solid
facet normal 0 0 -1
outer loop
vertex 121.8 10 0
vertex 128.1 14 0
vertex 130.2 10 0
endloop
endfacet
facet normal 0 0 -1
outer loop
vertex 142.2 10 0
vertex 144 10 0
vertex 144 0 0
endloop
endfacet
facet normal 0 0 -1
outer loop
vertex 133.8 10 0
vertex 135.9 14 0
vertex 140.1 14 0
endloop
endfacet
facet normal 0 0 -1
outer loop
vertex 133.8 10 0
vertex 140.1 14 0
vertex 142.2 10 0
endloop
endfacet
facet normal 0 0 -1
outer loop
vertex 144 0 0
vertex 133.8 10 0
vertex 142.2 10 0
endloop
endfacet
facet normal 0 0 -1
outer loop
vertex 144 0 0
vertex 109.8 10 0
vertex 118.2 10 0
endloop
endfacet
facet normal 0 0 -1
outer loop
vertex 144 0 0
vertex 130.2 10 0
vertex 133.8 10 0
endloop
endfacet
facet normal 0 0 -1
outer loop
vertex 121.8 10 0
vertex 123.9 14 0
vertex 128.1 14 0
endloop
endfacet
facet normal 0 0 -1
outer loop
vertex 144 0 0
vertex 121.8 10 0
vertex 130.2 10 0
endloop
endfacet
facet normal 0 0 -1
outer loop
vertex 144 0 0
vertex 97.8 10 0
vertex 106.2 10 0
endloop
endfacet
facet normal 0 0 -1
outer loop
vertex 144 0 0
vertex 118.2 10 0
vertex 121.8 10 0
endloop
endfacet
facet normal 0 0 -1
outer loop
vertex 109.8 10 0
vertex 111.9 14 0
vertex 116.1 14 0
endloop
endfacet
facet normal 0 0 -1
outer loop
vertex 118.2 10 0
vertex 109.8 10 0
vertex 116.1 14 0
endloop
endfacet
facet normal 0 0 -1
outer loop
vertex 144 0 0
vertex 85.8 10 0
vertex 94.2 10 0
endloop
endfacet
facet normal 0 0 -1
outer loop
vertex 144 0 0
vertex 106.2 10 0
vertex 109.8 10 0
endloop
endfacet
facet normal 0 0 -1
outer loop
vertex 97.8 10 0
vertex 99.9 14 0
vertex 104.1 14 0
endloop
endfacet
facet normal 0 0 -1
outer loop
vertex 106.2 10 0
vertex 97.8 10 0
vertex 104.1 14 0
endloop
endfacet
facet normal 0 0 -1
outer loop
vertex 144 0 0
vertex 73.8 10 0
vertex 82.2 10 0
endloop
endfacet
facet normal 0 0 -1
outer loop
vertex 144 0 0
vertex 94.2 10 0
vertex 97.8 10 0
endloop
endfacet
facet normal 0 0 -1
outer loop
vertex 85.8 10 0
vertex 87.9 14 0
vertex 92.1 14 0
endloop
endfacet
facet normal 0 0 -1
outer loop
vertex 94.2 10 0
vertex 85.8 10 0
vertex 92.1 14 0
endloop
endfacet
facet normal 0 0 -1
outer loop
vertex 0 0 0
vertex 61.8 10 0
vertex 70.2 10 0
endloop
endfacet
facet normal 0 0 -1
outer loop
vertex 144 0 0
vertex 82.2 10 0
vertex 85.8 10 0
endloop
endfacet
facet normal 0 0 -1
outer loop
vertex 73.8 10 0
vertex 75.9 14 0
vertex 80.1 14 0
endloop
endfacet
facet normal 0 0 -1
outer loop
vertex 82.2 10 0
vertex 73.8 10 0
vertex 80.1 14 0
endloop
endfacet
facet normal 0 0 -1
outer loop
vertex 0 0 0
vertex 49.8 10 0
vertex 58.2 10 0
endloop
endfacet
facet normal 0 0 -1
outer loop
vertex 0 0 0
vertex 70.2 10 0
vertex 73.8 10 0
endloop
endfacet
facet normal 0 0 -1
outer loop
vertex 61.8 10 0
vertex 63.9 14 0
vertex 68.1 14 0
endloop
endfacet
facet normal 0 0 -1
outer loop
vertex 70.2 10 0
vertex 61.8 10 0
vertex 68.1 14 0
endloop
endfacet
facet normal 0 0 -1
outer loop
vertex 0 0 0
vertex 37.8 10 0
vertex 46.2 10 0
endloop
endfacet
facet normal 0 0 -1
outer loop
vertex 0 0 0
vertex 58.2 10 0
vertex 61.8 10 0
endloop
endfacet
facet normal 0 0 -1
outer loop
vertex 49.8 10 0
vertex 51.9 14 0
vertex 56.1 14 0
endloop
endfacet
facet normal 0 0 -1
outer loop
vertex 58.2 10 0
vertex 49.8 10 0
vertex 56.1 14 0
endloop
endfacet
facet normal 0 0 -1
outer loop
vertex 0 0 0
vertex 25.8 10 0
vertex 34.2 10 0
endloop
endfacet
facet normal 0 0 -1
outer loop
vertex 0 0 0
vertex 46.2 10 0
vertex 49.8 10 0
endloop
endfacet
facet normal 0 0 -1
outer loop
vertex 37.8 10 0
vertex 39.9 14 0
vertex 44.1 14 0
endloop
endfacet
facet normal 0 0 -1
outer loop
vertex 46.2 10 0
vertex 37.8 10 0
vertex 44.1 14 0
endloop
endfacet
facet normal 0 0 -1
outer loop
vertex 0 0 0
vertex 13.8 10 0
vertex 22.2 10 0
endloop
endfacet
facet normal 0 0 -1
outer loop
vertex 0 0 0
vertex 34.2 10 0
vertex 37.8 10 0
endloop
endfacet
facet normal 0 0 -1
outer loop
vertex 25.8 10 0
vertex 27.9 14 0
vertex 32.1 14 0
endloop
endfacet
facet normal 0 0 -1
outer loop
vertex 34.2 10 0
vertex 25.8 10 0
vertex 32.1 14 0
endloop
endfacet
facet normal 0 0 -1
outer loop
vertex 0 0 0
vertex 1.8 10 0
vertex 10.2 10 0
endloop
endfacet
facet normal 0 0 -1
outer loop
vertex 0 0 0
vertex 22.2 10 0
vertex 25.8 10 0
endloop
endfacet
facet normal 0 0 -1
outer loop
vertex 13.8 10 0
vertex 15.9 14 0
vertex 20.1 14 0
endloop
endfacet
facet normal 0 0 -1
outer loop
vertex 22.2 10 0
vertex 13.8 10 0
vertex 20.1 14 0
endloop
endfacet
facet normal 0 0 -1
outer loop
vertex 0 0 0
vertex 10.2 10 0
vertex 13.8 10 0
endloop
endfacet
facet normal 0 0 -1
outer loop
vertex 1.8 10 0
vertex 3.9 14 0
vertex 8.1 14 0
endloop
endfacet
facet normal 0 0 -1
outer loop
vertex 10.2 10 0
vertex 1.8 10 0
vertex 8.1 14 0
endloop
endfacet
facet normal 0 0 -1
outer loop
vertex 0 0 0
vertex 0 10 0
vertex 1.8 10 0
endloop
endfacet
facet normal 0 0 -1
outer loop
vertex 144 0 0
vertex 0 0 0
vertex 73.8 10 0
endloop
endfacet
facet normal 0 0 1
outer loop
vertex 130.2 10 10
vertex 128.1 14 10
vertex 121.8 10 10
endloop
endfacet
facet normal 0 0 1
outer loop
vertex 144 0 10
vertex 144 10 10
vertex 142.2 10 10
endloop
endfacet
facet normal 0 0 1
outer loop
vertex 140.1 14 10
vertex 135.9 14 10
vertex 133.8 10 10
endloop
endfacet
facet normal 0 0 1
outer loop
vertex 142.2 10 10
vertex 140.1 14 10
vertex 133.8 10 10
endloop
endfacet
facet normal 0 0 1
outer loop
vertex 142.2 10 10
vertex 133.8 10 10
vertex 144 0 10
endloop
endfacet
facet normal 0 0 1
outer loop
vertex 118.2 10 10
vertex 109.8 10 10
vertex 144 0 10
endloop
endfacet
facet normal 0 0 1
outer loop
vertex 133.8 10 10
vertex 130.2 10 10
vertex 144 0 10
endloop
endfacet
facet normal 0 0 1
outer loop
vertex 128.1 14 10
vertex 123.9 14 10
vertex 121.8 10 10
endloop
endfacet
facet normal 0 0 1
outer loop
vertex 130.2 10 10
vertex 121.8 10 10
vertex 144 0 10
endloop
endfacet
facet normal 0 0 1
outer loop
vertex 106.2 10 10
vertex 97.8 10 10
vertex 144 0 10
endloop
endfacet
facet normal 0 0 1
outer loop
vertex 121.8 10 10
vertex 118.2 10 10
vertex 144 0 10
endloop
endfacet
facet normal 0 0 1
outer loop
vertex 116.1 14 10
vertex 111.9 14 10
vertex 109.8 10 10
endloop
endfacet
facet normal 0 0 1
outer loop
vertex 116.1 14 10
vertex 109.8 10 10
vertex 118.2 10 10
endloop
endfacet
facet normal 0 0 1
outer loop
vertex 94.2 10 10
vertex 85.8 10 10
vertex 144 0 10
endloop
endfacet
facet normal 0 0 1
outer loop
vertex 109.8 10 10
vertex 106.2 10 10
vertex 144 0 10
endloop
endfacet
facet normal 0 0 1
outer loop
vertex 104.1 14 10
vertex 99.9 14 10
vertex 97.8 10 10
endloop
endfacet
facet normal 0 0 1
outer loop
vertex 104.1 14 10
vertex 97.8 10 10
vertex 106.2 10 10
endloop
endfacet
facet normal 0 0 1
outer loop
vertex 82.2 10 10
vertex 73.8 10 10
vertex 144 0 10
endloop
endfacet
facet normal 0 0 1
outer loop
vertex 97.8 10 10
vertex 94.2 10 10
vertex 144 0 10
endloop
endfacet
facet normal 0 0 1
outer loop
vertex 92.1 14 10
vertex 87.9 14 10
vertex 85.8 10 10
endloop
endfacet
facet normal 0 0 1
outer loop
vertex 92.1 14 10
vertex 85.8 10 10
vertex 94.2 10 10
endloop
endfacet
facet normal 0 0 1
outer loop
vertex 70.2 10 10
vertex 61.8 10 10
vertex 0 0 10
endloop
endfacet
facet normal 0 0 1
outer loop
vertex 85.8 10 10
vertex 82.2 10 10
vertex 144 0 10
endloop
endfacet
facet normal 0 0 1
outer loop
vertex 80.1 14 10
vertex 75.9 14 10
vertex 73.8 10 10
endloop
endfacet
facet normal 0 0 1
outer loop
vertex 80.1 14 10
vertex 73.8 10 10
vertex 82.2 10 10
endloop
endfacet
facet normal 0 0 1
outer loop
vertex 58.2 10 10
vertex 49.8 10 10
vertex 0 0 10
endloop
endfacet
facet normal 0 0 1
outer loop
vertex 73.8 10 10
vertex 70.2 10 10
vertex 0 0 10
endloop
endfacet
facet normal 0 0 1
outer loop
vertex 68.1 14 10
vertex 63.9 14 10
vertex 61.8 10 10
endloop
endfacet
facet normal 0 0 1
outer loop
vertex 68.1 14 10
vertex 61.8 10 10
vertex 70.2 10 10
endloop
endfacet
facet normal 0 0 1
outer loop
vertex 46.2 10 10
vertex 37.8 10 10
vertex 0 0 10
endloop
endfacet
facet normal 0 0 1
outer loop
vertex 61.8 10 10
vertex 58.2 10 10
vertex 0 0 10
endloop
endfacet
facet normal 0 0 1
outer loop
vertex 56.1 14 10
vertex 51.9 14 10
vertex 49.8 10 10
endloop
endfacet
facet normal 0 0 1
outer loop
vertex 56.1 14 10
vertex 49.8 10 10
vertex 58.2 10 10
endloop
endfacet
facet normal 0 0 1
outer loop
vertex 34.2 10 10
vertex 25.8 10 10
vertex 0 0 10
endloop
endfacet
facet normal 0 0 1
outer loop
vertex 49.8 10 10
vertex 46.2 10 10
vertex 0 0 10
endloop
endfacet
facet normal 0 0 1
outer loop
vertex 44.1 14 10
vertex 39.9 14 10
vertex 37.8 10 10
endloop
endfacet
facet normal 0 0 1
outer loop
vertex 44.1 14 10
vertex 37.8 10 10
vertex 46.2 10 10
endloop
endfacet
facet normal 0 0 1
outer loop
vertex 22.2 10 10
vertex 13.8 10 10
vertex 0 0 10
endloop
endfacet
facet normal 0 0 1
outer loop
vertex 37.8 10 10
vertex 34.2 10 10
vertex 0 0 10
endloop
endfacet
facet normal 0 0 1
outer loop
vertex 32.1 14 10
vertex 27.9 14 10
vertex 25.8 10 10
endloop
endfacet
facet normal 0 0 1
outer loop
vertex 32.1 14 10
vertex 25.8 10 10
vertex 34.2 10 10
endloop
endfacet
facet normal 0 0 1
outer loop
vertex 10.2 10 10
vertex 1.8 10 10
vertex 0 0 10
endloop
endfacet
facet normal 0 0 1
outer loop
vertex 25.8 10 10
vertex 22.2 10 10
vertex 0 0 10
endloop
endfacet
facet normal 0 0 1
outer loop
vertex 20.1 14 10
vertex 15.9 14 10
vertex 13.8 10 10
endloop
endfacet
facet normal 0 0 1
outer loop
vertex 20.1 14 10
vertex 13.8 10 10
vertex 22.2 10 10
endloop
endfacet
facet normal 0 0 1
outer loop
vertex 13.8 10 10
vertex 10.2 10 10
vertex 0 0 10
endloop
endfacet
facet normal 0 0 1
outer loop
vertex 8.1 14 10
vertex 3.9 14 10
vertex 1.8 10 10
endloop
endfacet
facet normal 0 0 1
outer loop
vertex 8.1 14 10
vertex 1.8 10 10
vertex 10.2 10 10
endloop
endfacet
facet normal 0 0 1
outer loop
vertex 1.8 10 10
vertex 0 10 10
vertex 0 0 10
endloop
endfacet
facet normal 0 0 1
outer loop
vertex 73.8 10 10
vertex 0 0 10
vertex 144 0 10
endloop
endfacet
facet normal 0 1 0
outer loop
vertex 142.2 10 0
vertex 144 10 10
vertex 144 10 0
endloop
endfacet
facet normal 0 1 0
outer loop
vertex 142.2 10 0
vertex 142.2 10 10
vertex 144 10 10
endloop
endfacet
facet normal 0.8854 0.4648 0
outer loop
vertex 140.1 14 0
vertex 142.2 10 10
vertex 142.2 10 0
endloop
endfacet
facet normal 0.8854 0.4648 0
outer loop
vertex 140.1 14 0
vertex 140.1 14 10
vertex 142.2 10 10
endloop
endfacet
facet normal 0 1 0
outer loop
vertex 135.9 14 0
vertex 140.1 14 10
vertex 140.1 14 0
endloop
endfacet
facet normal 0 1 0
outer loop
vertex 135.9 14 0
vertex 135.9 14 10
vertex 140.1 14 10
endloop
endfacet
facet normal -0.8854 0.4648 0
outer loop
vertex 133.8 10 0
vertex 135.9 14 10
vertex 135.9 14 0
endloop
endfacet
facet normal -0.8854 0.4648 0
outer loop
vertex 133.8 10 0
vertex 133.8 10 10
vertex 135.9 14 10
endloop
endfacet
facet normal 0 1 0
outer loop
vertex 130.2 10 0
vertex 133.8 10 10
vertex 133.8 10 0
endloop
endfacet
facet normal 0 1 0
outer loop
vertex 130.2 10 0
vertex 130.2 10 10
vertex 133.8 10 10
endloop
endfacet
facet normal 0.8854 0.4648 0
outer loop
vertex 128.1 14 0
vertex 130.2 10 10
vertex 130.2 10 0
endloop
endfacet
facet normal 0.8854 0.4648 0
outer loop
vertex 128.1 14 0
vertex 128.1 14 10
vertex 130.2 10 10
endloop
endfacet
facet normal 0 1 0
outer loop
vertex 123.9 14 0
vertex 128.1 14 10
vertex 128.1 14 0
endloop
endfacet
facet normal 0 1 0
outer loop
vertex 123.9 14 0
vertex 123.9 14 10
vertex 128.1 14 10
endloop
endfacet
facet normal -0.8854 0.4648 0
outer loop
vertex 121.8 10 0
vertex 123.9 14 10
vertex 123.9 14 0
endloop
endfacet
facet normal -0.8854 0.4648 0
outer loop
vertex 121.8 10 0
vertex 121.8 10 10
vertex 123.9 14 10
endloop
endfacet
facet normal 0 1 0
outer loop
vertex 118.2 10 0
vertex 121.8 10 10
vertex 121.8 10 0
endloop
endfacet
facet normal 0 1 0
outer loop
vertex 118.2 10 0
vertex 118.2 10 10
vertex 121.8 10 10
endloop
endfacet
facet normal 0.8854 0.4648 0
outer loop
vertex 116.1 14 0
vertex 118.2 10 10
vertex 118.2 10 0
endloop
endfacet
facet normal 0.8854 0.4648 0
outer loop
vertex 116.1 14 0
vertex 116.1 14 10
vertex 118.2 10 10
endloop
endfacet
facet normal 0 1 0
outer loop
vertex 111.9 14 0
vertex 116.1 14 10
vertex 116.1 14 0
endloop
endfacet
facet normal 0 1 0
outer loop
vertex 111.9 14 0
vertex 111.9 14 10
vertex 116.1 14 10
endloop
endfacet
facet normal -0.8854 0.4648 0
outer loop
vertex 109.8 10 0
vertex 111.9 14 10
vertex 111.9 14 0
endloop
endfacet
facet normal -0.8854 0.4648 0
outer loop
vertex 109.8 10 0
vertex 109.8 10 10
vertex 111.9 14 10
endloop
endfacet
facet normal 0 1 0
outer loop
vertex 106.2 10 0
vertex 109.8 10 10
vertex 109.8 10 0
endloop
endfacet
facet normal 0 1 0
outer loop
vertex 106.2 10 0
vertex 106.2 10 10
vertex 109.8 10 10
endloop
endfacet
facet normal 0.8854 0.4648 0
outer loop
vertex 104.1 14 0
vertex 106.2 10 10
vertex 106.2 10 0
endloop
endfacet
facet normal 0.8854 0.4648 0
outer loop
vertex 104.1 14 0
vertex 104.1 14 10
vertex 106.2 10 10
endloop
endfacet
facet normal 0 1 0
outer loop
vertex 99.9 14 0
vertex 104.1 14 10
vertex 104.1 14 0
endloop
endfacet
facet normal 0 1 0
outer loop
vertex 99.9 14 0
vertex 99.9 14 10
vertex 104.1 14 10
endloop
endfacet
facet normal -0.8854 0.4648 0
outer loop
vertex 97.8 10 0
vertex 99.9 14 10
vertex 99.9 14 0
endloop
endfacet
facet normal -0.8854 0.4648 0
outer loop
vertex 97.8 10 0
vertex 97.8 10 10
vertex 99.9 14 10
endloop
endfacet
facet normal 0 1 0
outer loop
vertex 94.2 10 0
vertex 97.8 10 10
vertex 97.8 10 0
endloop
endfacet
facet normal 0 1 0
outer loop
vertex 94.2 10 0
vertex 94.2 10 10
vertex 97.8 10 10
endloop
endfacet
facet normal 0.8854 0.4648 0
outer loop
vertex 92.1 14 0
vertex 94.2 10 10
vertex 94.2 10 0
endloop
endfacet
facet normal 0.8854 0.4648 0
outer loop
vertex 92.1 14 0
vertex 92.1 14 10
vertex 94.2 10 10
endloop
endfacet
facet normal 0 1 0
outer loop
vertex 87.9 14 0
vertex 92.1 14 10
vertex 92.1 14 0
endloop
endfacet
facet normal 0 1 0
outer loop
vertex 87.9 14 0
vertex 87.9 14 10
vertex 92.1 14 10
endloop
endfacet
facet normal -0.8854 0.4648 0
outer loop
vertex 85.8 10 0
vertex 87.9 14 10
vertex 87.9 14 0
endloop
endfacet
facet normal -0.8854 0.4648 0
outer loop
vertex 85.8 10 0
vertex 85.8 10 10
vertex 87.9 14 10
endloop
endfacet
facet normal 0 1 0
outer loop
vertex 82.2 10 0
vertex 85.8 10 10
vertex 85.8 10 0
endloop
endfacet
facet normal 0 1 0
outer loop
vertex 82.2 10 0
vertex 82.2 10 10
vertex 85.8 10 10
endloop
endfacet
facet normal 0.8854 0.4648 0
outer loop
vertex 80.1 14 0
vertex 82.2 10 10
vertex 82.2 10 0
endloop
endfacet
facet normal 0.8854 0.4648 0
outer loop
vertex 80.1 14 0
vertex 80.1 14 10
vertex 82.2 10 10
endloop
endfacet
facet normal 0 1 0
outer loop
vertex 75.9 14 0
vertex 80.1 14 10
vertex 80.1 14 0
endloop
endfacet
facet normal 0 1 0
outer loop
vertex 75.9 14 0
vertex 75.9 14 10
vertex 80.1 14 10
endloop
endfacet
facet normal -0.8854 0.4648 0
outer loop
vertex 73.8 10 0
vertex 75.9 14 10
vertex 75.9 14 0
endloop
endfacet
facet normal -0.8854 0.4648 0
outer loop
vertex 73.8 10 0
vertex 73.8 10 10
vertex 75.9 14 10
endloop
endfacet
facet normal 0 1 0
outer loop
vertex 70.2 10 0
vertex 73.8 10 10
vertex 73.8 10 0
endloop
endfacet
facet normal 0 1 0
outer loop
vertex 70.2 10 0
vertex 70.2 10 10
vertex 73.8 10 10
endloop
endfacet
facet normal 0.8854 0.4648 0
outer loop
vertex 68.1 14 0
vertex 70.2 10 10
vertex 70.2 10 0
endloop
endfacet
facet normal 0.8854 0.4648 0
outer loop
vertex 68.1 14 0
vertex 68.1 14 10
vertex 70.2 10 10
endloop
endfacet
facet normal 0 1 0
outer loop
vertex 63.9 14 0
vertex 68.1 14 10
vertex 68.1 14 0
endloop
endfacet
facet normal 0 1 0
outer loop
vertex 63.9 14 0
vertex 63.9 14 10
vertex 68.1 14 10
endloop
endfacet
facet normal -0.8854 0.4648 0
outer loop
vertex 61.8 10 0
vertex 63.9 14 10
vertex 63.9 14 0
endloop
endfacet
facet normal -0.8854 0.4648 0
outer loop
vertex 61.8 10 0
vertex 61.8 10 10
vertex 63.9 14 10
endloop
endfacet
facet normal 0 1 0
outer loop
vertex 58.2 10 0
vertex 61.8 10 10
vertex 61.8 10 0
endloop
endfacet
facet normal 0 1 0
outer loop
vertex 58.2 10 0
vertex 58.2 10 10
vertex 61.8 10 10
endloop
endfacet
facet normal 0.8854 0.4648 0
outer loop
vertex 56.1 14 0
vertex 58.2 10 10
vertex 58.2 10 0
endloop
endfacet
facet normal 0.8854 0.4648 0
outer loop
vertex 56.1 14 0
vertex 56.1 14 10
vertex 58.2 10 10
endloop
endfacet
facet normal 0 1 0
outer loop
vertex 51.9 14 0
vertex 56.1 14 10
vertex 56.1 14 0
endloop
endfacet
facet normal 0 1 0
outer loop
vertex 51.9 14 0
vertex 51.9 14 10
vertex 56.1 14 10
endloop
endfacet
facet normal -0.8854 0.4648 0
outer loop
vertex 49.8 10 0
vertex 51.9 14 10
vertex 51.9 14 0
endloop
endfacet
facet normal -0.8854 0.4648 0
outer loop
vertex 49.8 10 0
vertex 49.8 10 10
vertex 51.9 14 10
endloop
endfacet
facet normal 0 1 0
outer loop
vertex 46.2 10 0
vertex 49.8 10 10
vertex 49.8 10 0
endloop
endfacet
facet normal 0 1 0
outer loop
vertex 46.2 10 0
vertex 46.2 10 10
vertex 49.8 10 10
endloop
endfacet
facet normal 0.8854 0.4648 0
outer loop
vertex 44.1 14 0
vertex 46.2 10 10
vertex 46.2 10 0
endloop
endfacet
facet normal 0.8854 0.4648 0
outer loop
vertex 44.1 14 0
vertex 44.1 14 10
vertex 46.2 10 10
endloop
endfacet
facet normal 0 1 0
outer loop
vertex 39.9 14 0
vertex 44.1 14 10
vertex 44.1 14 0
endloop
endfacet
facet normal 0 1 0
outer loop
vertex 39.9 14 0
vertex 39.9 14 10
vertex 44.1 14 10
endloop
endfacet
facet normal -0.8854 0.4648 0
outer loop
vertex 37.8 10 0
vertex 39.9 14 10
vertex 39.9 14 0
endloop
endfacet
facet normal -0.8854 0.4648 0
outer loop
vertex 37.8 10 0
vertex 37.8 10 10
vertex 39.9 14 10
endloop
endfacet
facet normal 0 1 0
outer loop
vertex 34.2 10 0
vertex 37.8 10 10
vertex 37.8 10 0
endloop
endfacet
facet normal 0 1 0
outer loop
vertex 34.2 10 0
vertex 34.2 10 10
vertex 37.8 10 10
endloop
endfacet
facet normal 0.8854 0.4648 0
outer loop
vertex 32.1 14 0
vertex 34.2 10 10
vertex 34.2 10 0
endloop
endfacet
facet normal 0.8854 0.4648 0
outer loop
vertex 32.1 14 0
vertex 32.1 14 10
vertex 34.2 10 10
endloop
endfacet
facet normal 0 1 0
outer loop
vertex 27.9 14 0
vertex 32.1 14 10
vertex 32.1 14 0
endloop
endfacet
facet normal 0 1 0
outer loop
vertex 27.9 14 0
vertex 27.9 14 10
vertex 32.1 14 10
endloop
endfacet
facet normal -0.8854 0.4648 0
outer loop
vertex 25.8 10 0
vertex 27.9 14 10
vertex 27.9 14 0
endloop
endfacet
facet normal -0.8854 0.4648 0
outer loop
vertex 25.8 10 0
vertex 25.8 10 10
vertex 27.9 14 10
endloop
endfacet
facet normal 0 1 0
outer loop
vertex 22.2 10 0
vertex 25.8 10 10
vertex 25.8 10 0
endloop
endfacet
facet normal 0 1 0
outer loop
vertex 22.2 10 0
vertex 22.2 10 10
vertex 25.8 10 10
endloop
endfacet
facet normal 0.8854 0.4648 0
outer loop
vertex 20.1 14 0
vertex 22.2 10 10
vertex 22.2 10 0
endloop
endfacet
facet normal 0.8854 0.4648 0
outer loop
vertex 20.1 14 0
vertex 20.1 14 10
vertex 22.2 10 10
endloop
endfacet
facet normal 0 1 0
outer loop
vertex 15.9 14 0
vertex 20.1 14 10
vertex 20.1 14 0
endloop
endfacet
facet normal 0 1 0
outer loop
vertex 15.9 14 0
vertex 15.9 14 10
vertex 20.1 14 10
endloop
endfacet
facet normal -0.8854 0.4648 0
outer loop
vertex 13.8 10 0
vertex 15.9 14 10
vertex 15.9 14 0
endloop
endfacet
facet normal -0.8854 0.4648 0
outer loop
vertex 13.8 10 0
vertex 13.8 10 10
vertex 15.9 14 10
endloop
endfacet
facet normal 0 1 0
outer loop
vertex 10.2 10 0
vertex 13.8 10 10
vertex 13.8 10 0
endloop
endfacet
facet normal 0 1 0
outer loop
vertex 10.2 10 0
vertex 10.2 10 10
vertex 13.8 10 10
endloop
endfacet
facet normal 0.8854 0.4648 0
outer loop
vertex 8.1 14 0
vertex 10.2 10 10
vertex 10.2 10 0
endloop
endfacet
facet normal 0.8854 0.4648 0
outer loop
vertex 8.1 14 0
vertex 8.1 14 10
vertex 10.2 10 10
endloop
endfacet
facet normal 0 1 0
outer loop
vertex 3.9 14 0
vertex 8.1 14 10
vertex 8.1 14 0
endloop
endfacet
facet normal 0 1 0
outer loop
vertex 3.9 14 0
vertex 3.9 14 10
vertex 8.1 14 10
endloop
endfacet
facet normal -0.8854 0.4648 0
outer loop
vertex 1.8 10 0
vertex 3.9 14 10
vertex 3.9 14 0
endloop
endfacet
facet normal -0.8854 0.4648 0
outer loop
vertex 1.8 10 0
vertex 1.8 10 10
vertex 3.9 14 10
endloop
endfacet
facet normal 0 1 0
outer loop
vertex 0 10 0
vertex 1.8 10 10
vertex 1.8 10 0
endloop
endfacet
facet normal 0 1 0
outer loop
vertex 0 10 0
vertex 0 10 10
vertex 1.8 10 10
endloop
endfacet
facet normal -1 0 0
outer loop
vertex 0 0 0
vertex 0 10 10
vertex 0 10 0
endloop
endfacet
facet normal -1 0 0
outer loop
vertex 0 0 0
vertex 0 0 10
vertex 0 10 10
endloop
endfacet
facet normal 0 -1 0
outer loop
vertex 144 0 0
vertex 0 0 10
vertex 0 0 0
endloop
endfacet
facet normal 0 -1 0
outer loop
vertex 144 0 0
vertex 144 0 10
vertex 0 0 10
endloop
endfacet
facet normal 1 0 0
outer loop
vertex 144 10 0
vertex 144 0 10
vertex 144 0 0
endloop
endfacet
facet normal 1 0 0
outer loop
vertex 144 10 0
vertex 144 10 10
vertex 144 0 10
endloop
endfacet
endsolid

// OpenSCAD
$fn = 32;

// ----------------------------------------------------------------------
// Gear rack: 12 teeth, pitch 12 mm
// ----------------------------------------------------------------------

// --- parameters (mm) ---
teeth = 12;               // number of teeth
pitch = 12;               // tooth pitch, X
root_w = 8.4;             // tooth width at the root
tip_w = 4.2;              // tooth width at the tip
base_h = 10;              // rack body height, Y
tooth_h = 4;              // tooth height above the body
plate_t = 10;             // rack width, Z (extrusion height)

rack_l = teeth * pitch;  // overall length
total_h = base_h + tooth_h;  // overall height

profile = [[0, 0], [144, 0], [144, 10], [142.2, 10], [140.1, 14], [135.9, 14], [133.8, 10], [130.2, 10], [128.1, 14], [123.9, 14], [121.8, 10], [118.2, 10], [116.1, 14], [111.9, 14], [109.8, 10], [106.2, 10], [104.1, 14], [99.9, 14], [97.8, 10], [94.2, 10], [92.1, 14], [87.9, 14], [85.8, 10], [82.2, 10], [80.1, 14], [75.9, 14], [73.8, 10], [70.2, 10], [68.1, 14], [63.9, 14], [61.8, 10], [58.2, 10], [56.1, 14], [51.9, 14], [49.8, 10], [46.2, 10], [44.1, 14], [39.9, 14], [37.8, 10], [34.2, 10], [32.1, 14], [27.9, 14], [25.8, 10], [22.2, 10], [20.1, 14], [15.9, 14], [13.8, 10], [10.2, 10], [8.1, 14], [3.9, 14], [1.8, 10], [0, 10]];  // primary outline, 52 points, counter clockwise

// --- the one profile operation ---
linear_extrude(height = plate_t) polygon(points = profile);
